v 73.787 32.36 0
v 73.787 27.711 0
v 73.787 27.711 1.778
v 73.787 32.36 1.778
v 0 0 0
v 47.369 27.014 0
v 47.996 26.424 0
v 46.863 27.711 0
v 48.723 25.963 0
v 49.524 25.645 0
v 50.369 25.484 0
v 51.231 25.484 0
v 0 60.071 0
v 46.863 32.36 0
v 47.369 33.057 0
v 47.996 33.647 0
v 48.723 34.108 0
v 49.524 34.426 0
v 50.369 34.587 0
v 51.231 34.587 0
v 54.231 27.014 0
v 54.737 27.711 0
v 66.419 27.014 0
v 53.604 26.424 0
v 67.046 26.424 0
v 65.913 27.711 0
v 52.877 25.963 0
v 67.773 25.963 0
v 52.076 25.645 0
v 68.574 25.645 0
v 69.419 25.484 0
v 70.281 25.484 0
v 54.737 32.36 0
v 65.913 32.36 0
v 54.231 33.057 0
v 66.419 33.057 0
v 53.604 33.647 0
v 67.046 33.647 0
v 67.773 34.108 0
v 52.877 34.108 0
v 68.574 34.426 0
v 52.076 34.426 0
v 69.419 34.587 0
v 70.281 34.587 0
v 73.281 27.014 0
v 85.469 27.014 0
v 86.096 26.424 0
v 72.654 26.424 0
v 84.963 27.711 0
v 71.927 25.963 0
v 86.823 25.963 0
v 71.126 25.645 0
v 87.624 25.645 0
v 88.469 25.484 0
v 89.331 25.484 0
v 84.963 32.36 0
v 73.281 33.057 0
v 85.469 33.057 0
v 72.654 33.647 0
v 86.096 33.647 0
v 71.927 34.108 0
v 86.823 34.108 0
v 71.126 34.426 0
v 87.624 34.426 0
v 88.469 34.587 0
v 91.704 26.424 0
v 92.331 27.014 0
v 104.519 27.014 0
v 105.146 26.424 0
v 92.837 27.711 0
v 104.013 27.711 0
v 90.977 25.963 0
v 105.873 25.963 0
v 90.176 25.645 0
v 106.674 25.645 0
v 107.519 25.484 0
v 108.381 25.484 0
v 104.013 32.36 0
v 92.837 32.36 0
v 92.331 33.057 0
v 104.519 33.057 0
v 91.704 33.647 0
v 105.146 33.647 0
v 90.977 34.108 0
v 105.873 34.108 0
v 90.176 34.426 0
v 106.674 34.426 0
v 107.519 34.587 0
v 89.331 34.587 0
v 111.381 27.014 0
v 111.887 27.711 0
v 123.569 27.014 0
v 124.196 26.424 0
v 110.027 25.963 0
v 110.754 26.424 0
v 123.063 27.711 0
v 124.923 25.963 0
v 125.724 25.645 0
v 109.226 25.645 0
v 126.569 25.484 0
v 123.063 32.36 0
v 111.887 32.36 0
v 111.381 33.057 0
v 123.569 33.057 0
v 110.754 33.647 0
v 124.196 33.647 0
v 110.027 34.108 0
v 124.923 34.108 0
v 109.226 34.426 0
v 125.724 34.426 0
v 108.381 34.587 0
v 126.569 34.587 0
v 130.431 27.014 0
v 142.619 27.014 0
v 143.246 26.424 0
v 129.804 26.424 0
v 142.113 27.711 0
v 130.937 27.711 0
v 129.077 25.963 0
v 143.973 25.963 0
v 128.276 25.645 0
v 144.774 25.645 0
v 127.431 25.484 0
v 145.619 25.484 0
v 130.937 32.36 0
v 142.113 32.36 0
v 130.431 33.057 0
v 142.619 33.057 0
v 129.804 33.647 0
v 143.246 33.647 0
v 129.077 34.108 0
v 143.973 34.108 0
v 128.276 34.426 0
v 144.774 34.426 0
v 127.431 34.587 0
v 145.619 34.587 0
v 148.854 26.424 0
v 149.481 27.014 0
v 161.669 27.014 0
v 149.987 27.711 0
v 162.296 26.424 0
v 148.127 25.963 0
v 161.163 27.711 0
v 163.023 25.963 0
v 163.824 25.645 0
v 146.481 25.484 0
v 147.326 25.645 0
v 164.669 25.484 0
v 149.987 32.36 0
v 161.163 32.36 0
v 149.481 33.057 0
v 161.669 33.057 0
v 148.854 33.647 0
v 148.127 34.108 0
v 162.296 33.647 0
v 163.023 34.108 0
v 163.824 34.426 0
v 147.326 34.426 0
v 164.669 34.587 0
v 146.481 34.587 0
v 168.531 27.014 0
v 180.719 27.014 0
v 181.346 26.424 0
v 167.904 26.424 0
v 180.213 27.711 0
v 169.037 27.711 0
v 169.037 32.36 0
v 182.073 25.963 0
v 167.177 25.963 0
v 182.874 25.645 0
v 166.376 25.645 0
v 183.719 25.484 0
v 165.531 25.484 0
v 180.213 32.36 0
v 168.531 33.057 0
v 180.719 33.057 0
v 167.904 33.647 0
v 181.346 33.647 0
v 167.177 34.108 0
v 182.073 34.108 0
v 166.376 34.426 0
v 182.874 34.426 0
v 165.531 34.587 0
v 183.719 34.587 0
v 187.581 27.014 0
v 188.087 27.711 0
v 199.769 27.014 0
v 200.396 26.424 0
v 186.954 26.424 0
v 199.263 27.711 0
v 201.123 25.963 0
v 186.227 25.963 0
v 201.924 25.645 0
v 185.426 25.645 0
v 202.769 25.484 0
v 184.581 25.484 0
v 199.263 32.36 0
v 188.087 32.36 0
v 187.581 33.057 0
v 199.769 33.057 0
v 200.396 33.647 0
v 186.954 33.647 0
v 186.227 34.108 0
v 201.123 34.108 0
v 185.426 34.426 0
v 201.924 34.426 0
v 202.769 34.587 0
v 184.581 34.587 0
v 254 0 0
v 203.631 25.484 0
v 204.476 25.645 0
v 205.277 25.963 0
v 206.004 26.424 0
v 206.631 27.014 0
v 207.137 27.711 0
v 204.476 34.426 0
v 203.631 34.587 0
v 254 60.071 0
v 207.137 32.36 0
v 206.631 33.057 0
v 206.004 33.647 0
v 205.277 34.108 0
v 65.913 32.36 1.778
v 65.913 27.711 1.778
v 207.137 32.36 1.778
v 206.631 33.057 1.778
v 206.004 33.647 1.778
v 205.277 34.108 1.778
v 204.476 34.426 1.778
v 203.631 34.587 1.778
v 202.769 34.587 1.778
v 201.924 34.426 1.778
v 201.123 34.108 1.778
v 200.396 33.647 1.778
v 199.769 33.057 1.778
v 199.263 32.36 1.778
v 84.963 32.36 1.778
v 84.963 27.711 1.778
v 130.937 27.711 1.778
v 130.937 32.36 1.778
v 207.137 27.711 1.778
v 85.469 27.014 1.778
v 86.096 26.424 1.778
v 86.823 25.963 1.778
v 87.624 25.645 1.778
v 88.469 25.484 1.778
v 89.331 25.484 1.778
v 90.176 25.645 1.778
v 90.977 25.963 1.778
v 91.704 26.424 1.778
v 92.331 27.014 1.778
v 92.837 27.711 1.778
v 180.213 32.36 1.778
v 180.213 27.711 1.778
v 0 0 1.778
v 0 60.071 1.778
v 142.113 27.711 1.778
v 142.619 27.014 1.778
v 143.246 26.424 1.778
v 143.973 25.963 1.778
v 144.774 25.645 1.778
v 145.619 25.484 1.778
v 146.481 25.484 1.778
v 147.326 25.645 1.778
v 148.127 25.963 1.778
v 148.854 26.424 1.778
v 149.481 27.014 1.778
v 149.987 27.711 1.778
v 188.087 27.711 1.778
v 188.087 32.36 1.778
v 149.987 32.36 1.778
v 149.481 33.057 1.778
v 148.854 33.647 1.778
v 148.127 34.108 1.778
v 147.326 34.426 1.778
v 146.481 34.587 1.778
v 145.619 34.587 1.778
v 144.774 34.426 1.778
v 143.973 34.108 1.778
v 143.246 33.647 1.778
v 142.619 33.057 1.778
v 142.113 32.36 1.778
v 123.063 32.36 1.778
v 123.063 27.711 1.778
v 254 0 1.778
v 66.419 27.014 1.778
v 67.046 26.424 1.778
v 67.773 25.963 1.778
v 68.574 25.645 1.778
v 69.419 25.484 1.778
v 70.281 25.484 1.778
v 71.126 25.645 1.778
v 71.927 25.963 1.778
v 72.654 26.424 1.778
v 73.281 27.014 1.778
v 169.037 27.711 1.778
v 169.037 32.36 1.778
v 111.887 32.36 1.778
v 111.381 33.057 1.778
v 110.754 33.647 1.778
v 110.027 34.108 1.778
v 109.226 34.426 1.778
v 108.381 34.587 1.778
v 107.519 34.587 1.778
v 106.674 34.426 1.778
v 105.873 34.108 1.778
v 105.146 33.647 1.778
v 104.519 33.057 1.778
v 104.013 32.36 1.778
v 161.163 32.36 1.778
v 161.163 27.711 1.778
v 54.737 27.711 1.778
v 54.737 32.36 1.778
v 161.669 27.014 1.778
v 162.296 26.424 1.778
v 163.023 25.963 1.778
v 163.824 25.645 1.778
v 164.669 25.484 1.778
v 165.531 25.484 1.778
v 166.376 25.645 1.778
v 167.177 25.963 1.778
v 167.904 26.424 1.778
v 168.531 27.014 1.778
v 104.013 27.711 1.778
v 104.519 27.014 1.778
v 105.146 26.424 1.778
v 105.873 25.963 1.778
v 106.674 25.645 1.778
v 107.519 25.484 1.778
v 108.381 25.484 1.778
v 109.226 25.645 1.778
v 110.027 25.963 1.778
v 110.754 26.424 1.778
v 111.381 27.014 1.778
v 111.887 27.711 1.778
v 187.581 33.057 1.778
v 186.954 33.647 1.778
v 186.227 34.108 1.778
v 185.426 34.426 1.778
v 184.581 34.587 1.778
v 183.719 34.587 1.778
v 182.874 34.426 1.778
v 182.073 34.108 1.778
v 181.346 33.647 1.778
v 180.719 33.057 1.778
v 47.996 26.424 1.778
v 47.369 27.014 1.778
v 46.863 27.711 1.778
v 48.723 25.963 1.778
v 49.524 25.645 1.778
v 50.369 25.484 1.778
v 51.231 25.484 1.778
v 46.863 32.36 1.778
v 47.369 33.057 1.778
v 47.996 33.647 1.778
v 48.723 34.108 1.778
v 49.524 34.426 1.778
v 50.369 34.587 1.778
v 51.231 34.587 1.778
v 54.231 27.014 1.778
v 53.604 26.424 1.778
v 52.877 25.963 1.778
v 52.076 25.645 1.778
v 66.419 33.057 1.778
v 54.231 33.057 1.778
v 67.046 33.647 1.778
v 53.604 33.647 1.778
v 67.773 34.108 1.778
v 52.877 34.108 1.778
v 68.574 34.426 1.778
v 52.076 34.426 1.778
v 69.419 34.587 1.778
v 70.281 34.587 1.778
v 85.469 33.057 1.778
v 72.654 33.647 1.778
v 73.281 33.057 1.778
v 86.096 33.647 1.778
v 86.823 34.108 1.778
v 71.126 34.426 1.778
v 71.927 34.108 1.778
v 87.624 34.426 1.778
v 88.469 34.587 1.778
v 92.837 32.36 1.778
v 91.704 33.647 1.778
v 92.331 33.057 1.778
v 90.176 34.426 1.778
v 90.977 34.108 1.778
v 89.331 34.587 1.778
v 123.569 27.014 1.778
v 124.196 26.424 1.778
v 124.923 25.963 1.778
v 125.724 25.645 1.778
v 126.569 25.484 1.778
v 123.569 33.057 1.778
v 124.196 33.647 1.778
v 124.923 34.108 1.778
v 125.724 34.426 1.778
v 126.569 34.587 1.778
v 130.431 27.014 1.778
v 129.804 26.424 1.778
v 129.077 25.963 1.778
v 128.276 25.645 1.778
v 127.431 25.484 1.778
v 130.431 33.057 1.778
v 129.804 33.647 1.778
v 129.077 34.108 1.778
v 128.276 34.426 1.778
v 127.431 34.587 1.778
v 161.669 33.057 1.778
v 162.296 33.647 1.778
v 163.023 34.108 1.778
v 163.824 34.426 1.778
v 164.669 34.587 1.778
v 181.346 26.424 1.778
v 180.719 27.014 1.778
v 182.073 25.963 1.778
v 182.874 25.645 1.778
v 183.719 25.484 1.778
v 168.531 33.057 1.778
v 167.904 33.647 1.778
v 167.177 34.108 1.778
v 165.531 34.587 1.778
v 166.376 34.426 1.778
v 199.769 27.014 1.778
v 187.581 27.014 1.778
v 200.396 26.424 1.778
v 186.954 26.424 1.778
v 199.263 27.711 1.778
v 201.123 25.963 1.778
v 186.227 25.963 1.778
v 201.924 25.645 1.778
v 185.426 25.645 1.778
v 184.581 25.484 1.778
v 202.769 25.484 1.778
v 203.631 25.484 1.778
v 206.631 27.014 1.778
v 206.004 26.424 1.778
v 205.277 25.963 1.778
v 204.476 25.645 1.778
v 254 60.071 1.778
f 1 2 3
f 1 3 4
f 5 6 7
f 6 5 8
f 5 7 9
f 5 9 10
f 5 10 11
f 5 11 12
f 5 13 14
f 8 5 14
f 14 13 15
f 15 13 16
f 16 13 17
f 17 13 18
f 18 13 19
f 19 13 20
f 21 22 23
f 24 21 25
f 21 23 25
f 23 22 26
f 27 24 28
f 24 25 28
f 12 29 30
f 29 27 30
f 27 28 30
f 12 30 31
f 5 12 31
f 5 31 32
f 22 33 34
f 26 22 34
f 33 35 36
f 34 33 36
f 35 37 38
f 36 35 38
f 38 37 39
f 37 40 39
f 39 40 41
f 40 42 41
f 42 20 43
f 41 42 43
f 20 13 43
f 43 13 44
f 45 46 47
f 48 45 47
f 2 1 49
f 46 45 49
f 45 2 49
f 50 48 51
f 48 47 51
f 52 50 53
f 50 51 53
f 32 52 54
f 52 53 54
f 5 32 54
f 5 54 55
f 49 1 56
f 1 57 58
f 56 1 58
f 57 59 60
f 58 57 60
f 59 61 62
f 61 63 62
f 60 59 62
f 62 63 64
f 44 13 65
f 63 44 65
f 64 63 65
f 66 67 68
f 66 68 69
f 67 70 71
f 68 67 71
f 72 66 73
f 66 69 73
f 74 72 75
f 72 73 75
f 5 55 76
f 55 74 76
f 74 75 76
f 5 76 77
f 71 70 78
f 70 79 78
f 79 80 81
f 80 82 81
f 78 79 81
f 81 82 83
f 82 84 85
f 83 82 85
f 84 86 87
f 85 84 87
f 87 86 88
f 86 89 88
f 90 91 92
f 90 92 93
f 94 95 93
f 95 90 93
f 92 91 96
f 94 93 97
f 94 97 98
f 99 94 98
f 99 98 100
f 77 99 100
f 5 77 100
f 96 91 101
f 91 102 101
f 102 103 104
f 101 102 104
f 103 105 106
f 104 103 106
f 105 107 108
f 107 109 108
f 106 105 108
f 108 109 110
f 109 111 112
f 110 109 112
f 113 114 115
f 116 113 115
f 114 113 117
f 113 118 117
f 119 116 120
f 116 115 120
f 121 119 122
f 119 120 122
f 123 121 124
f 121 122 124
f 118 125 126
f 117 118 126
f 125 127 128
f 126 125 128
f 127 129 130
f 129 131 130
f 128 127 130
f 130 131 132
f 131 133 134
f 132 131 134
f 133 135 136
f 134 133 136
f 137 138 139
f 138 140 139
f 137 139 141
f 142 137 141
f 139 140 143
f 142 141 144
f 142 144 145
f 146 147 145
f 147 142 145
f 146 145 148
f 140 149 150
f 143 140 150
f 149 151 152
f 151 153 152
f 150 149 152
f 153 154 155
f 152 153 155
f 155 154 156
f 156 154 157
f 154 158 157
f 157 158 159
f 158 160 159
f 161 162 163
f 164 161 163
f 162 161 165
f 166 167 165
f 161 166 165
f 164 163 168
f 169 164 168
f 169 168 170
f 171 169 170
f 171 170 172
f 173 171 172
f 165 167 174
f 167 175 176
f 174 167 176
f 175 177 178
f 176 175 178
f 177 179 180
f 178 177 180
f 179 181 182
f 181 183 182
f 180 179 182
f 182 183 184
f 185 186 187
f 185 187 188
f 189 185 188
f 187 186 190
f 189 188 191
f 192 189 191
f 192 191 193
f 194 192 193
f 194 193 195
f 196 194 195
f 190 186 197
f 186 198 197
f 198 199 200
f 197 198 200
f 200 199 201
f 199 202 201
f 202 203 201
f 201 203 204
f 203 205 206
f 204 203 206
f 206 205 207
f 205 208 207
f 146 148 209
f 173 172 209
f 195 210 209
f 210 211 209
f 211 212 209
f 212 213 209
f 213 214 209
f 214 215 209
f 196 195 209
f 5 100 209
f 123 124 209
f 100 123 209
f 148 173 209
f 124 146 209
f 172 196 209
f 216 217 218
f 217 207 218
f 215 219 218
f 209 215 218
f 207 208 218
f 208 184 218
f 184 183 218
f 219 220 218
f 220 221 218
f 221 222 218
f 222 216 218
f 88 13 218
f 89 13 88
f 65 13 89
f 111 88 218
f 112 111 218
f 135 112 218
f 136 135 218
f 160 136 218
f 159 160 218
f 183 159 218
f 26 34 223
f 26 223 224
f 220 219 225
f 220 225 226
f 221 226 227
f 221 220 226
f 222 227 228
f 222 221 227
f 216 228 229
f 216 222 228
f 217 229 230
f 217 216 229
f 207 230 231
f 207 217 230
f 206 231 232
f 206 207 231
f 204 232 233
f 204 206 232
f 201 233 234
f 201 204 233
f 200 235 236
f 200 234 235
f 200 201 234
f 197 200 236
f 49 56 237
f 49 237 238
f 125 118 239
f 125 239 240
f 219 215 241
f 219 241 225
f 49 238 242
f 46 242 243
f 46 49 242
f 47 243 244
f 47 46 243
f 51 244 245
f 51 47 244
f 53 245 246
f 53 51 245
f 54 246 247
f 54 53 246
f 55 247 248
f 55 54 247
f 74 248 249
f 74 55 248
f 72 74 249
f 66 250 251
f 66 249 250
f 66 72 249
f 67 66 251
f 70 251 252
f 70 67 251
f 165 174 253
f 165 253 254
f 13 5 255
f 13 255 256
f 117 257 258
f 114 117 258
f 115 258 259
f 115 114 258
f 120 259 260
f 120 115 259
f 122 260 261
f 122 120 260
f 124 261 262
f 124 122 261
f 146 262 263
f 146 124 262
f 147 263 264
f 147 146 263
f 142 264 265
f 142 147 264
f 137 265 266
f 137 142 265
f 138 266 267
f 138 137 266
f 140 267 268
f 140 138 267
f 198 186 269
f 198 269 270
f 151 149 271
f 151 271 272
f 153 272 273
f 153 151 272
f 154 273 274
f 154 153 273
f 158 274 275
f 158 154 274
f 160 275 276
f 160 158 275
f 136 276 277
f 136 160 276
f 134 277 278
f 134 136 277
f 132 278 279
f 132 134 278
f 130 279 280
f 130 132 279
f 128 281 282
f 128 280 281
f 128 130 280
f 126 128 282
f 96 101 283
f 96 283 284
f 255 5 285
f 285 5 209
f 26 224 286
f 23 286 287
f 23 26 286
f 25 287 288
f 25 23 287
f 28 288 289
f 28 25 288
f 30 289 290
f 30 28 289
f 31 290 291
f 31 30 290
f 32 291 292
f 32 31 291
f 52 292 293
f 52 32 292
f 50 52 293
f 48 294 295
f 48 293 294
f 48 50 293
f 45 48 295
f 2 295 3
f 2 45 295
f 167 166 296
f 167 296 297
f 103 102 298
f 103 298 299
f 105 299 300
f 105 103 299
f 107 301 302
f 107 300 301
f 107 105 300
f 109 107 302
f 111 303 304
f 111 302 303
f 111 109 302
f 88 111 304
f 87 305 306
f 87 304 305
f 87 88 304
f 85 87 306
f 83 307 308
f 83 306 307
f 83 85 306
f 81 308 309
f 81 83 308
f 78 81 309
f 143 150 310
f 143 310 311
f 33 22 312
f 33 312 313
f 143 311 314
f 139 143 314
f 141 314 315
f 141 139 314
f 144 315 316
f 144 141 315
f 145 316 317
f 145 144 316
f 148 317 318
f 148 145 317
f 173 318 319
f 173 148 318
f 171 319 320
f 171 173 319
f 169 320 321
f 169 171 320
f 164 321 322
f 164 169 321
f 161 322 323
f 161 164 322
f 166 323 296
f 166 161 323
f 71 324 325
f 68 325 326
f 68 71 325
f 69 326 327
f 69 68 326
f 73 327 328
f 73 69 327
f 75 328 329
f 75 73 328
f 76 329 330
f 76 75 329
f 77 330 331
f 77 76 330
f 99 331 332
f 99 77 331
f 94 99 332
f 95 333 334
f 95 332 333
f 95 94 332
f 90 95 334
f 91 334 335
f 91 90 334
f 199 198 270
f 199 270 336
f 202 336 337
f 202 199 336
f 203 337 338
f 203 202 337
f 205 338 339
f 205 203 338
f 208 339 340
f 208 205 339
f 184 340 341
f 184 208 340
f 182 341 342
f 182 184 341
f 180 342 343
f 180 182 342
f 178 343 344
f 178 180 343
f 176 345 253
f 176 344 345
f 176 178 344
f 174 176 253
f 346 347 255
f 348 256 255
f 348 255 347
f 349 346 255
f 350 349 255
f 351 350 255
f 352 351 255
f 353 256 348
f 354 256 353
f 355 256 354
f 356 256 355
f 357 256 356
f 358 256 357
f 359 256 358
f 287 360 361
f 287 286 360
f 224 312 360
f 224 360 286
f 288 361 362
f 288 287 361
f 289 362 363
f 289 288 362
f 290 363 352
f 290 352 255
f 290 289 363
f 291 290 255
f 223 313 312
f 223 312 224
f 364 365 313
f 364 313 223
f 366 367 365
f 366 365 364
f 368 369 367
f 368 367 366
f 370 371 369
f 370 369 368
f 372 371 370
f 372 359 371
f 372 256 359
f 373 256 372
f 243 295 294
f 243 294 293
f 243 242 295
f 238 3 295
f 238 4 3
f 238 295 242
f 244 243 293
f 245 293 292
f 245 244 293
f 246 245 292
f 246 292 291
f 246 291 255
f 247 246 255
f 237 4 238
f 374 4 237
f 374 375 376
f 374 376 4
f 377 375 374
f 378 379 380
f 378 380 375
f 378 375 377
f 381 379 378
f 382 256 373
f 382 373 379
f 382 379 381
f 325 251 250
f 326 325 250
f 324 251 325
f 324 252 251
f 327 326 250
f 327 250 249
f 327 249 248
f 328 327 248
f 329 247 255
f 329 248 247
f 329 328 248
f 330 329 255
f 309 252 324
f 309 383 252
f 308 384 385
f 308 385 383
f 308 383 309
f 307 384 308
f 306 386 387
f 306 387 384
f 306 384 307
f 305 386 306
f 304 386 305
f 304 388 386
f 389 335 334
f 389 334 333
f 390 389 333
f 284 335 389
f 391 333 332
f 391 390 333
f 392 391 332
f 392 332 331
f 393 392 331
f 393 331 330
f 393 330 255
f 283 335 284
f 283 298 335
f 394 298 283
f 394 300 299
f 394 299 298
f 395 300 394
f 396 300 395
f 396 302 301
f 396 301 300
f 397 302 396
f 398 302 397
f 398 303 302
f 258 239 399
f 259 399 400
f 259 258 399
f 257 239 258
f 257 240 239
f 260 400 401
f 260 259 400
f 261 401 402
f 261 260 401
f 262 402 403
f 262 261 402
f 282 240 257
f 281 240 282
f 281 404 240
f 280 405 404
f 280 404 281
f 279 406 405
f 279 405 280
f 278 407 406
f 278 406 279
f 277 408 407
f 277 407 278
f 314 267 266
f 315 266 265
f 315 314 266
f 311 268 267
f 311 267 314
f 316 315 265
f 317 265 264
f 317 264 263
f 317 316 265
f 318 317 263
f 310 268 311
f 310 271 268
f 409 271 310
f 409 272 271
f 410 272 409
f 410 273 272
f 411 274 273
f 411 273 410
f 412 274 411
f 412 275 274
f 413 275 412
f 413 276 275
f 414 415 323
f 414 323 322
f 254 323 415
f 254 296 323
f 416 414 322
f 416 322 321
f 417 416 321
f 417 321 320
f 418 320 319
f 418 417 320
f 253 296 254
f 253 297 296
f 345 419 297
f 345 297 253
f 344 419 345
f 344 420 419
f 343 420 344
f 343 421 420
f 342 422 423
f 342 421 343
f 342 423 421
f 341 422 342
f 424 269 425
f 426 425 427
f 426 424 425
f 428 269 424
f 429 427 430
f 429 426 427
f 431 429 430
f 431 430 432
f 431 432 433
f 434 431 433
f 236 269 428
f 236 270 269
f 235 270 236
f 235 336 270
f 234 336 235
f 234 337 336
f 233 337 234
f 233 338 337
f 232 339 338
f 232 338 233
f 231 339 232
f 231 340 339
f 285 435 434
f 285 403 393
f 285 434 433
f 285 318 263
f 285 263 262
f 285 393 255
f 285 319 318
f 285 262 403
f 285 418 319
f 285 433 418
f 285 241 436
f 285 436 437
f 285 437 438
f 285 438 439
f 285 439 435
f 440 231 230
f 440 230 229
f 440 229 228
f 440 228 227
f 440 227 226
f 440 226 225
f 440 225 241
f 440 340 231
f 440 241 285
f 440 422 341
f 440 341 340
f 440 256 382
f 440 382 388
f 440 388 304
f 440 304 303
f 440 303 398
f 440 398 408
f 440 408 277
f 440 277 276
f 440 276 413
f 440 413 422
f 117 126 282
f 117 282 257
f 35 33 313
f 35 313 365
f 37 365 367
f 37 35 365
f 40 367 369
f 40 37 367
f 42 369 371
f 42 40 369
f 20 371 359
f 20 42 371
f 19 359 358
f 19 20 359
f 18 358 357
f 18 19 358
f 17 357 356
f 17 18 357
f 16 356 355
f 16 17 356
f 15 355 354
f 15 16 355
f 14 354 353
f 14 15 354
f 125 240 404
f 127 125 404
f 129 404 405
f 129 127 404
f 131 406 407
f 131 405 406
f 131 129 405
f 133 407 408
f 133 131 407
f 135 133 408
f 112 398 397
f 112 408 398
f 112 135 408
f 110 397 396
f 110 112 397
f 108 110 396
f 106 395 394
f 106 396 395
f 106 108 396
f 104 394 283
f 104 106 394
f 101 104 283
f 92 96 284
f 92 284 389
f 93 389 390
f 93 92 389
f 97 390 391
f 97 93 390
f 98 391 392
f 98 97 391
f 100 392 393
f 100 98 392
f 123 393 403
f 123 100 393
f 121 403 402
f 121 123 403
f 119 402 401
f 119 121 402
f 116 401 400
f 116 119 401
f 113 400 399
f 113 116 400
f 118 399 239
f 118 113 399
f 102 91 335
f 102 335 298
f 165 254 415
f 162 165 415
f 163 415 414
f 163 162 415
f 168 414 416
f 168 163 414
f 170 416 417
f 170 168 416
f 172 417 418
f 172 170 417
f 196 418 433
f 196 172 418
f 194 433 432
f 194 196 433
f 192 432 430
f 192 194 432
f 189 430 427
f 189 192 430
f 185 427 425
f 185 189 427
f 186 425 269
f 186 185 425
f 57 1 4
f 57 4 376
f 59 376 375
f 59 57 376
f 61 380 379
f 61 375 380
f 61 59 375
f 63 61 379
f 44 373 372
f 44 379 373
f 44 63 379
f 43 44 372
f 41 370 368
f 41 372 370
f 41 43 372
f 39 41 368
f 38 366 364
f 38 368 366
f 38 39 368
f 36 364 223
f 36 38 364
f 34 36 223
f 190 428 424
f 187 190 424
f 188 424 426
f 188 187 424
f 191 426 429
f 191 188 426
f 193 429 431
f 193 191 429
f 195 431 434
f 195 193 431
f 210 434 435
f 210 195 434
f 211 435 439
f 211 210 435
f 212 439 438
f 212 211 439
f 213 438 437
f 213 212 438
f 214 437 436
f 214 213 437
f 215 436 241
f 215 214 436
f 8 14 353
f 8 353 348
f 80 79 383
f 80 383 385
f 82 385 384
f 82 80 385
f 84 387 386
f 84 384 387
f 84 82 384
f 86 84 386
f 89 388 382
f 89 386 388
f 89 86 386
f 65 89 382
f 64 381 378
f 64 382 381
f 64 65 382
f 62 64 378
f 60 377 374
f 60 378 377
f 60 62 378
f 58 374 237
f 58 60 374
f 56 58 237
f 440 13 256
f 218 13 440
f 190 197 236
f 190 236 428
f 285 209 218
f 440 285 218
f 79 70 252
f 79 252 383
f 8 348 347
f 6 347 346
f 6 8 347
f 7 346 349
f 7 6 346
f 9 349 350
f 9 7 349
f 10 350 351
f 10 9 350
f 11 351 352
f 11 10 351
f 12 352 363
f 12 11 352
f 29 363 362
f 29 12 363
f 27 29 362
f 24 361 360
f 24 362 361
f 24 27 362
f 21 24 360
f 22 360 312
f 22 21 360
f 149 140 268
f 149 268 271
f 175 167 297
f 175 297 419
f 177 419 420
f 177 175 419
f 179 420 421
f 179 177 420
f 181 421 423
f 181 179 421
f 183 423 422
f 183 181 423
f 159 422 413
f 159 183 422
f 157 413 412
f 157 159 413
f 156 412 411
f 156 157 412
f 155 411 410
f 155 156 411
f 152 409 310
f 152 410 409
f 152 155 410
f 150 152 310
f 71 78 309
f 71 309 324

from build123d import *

# Parameters (mm, degrees)
SKETCH1_W           = 254
SKETCH1_H           = 60.071
BOSS_EXTRUDE1_DEPTH = 1.778
CUT_EXTRUDE2_DEPTH  = 2.778
LPATTERN1_COUNT     = 9
LPATTERN1_PITCH     = 19.05


with BuildPart() as part:
    # Sketch1 → Boss-Extrude1 (new body)
    with BuildSketch(Plane.XY):
        with Locations((127, 30.0355)):
            Rectangle(SKETCH1_W, SKETCH1_H)
    extrude(amount=BOSS_EXTRUDE1_DEPTH)

    # Sketch1<3> → Cut-Extrude2 (cut, through all)
    with BuildSketch(Plane.XY):
        with BuildLine():
            Line((46.863, 32.359981663), (46.863, 27.711018337))
            ThreePointArc((46.863, 27.711018337), (50.8, 25.4635), (54.737, 27.711018337))
            Line((54.737, 27.711018337), (54.737, 32.359981663))
            ThreePointArc((54.737, 32.359981663), (50.8, 34.6075), (46.863, 32.359981663))
        make_face()
    cut_extrude2 = extrude(amount=CUT_EXTRUDE2_DEPTH, mode=Mode.SUBTRACT)

    # LPattern1: Cut-Extrude2 ×9
    with Locations(*[(i * LPATTERN1_PITCH, 0, 0) for i in range(1, LPATTERN1_COUNT)]):
        add(cut_extrude2, mode=Mode.SUBTRACT)


solid = part.part
